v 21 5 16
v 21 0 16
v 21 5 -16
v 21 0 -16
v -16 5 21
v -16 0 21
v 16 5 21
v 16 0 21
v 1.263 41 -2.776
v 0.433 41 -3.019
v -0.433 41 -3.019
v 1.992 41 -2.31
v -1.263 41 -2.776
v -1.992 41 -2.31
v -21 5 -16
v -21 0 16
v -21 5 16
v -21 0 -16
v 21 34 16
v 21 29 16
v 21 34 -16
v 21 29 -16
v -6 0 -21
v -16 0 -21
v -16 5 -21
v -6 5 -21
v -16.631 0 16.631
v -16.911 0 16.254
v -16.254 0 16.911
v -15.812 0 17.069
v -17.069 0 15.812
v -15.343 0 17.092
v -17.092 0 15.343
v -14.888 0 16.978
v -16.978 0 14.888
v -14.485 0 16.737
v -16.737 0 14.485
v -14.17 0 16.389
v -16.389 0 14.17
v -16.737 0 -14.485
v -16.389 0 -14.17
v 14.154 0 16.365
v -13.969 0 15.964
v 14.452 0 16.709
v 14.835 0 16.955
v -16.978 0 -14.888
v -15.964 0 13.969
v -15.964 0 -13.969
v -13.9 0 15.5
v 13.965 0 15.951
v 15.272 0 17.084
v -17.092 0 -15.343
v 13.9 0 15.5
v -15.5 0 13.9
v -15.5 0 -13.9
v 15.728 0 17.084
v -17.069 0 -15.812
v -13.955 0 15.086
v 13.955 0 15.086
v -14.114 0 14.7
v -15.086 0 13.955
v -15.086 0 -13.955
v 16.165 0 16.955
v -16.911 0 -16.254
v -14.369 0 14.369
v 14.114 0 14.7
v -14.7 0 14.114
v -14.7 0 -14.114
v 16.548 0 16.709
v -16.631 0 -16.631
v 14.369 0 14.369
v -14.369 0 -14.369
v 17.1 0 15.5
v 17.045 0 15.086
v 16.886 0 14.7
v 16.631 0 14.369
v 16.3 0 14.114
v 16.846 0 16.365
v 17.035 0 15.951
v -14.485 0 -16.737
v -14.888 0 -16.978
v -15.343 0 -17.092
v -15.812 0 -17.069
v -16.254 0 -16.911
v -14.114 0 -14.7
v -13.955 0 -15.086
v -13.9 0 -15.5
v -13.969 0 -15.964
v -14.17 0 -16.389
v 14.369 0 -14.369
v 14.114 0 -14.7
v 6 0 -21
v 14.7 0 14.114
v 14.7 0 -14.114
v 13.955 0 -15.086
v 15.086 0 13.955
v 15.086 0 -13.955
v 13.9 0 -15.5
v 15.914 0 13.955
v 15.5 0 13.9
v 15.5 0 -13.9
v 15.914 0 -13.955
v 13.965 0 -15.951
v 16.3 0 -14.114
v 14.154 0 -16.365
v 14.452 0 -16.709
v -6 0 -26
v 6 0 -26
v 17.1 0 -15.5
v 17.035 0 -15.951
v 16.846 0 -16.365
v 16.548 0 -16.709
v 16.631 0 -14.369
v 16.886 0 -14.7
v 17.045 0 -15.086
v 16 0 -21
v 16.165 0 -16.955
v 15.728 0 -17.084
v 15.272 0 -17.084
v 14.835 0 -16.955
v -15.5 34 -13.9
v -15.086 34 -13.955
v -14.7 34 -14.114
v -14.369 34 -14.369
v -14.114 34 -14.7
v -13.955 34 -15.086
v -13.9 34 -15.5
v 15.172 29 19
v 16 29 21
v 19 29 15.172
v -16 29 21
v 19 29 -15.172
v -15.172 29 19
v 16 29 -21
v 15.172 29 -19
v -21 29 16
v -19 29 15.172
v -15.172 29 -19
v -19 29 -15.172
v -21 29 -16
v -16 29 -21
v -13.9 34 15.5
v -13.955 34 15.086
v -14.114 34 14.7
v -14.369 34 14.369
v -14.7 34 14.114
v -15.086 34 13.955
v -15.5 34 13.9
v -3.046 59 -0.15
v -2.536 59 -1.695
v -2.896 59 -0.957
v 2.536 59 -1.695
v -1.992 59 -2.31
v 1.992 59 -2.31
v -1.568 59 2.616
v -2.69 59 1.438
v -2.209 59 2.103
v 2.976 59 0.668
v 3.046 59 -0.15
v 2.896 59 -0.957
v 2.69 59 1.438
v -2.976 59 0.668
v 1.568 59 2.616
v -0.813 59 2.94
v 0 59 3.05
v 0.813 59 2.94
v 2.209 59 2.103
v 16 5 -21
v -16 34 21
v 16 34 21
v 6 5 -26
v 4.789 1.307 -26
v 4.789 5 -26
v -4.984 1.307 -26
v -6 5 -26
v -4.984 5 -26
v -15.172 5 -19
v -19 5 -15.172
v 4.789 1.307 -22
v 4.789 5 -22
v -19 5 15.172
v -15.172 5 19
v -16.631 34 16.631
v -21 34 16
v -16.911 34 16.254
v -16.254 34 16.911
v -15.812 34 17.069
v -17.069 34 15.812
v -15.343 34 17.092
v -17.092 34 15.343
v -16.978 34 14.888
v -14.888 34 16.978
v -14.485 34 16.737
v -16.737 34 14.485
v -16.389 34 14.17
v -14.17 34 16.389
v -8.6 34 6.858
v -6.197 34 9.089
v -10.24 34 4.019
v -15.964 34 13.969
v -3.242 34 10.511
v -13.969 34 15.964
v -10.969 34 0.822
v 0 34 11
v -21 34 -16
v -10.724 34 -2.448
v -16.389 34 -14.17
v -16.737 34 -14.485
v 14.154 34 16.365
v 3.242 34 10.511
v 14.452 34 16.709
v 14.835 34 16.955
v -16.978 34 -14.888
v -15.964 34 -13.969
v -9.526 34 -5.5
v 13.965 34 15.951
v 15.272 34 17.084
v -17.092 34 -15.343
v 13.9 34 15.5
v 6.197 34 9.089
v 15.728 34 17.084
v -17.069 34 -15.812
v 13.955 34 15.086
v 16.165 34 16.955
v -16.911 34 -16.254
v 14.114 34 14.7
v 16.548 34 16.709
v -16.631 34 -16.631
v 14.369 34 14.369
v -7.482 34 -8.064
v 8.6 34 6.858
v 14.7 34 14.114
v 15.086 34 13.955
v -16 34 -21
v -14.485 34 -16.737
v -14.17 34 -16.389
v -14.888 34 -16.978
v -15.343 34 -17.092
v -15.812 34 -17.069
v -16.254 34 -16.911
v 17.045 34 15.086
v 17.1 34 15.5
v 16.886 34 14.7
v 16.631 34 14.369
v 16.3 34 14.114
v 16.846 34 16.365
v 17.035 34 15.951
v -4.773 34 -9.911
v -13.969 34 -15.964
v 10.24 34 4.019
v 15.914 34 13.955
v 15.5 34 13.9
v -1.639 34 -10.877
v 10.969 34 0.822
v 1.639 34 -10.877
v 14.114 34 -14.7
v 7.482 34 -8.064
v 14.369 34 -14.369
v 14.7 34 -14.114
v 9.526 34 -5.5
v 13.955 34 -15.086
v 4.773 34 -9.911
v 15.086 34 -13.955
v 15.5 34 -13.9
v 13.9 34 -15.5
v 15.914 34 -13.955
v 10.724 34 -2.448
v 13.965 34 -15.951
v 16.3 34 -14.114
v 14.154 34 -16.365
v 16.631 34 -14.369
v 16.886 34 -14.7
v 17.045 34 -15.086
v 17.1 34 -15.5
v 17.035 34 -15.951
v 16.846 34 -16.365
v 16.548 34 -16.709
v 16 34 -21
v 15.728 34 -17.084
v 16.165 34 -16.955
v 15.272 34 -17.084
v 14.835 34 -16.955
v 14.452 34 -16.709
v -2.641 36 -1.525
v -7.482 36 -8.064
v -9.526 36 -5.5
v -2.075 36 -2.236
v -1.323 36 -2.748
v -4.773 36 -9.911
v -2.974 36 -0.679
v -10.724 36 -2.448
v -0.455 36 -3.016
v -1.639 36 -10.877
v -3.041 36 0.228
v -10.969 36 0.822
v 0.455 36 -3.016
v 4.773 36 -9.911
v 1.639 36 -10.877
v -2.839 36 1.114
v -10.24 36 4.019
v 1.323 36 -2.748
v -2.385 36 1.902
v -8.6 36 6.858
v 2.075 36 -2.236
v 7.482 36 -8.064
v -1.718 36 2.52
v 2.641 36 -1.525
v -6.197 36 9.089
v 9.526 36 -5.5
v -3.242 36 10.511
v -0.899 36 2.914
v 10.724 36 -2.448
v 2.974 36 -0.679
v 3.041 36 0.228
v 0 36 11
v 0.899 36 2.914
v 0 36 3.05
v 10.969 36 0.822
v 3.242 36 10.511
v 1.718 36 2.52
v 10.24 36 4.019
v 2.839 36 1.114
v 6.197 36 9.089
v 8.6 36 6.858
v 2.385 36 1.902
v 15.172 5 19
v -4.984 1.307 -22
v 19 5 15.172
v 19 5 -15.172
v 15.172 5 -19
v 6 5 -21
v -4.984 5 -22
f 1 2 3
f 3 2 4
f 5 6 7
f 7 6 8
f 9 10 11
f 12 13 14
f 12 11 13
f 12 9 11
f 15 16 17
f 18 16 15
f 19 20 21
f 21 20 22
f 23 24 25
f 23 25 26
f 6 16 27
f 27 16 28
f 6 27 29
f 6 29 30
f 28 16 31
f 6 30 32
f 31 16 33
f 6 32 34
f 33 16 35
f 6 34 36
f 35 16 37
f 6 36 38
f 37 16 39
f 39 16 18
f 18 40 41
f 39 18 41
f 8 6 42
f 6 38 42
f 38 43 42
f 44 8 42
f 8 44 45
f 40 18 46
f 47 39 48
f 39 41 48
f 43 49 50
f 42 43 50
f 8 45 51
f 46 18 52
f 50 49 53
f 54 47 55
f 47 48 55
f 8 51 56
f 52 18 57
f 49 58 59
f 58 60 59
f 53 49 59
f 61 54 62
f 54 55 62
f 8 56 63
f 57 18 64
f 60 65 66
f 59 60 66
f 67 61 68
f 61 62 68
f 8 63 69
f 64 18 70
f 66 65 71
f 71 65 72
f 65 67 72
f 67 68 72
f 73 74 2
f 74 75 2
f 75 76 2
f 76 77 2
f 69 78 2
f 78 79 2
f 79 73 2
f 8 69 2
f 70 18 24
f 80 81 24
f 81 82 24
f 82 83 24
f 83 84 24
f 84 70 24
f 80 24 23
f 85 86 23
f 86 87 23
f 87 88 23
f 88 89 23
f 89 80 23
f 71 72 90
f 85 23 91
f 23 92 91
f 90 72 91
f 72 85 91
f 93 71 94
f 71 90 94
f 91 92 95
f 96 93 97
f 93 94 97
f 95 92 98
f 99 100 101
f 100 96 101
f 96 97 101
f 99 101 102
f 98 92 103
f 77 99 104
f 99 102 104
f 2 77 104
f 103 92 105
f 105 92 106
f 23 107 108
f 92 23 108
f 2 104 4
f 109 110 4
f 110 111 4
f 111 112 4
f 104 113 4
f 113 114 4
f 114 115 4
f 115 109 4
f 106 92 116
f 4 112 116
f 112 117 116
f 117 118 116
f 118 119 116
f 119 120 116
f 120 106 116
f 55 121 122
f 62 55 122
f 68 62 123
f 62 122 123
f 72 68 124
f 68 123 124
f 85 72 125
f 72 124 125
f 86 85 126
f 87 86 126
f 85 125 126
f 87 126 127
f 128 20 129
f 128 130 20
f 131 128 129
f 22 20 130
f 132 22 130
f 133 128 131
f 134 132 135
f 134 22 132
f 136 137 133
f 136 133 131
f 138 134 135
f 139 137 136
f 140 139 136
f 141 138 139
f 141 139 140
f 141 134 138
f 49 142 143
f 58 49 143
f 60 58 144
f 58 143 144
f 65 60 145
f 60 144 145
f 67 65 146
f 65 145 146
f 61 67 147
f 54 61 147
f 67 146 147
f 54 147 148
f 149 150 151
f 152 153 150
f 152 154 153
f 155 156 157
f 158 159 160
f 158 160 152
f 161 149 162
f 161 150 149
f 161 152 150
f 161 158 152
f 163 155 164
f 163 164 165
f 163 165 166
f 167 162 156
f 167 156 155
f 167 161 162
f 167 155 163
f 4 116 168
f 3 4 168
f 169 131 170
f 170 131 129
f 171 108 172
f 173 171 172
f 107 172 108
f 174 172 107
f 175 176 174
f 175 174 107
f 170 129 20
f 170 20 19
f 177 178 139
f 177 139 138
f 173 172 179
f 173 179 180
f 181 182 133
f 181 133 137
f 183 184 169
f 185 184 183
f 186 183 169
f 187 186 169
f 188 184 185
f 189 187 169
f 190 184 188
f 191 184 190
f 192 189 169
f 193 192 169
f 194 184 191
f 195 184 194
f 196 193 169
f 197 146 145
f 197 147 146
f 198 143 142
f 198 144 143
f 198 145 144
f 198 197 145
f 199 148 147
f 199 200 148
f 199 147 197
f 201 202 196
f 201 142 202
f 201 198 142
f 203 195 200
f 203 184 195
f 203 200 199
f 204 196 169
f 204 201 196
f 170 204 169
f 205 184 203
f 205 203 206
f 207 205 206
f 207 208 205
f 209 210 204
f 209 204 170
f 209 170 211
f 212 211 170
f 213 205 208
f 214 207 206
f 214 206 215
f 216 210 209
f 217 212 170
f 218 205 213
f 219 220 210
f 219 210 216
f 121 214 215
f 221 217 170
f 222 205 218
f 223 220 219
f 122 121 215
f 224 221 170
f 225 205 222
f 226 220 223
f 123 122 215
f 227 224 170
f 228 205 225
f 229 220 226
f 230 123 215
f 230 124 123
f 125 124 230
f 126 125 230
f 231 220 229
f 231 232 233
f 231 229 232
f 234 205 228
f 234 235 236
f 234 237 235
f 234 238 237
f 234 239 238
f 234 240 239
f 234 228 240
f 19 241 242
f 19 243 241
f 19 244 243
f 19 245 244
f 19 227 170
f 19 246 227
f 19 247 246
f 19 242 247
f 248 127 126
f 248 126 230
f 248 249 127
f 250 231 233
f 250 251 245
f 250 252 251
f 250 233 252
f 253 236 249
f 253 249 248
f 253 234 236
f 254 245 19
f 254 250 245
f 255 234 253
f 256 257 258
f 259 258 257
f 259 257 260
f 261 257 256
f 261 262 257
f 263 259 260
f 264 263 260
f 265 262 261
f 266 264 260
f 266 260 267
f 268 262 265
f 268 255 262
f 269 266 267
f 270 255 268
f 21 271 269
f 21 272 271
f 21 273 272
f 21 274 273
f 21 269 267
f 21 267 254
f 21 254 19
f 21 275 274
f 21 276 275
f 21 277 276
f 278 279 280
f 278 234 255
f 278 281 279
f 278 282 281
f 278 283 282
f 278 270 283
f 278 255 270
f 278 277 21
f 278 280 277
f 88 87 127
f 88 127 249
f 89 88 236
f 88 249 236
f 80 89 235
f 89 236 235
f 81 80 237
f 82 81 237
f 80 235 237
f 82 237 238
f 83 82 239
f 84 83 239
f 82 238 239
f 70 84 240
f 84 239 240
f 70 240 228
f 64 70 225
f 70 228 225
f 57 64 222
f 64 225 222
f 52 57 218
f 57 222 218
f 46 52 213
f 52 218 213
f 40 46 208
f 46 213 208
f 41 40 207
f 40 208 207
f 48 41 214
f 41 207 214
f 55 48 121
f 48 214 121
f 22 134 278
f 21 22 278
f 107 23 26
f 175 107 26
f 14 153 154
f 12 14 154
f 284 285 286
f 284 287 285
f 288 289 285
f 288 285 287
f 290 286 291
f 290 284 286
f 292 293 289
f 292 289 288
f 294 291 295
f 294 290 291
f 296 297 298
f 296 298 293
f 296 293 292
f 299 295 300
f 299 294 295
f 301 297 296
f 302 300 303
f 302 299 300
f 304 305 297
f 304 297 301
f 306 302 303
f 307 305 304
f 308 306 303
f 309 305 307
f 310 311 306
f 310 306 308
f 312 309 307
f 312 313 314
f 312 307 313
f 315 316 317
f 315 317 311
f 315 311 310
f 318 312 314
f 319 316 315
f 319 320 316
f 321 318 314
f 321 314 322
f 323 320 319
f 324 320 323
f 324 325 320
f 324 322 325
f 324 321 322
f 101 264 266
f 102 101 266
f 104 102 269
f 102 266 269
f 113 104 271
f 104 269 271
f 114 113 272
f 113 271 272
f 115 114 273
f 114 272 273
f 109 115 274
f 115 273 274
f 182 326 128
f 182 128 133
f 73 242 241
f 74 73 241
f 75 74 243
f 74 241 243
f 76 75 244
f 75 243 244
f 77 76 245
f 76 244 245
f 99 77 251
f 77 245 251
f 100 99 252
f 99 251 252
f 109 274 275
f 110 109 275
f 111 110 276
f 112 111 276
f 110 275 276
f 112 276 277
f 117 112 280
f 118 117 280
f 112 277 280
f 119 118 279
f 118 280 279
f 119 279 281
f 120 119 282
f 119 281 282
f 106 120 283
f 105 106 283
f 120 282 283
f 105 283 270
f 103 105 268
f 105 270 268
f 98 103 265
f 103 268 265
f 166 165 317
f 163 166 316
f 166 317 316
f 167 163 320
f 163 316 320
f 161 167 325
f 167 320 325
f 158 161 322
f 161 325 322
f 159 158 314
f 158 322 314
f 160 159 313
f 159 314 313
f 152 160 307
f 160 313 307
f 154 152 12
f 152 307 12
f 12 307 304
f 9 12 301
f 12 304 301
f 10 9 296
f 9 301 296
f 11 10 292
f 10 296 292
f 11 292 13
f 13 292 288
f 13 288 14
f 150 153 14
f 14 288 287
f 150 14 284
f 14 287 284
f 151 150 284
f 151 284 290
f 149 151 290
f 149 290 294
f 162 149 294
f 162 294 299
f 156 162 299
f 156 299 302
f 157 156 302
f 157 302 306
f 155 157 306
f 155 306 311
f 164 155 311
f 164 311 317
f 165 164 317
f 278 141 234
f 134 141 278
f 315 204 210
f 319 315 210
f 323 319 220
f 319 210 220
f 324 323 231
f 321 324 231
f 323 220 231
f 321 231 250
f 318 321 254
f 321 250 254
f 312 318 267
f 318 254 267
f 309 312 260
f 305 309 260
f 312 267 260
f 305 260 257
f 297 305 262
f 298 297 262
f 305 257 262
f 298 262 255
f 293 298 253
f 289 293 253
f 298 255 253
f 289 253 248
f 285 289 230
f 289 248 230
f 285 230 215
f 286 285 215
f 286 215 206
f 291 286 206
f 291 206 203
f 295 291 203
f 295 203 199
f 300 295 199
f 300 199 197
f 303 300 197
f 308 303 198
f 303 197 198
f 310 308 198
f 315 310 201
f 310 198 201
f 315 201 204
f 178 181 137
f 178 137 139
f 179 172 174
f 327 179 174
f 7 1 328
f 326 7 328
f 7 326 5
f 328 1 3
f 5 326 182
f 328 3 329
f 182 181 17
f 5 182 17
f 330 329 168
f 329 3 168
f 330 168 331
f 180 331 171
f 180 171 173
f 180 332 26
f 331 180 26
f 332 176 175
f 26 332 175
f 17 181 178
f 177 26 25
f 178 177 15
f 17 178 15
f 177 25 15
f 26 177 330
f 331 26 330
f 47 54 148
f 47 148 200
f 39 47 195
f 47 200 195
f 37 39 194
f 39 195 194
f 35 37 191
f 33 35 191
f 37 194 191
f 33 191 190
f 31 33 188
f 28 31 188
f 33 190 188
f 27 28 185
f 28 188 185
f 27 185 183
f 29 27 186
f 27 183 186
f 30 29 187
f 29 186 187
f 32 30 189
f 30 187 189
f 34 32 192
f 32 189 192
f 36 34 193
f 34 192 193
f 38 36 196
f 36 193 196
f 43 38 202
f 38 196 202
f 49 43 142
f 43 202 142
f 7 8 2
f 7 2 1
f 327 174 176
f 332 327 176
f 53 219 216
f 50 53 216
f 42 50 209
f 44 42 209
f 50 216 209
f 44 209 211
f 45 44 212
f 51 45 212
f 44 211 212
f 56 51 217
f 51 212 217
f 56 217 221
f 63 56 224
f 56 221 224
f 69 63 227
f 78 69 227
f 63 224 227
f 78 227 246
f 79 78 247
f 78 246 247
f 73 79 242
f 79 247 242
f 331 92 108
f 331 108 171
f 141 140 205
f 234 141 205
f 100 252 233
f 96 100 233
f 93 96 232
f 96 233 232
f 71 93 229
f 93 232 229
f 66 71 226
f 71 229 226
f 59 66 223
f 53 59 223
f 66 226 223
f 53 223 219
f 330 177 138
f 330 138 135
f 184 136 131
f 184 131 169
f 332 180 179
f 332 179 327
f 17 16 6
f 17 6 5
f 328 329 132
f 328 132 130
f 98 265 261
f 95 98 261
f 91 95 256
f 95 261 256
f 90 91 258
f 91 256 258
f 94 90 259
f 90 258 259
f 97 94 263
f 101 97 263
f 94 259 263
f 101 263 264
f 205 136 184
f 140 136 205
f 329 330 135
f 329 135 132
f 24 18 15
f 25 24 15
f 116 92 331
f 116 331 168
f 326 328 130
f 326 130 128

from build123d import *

# Parameters (mm, degrees)
SKETCH_1_W          = 42
SKETCH_1_H          = 42
EXTRUDE_1_DEPTH     = 34
SKETCH_2_R          = 11
EXTRUDE_2_DEPTH     = 2
SKETCH_3_R          = 3.05
EXTRUDE_3_DEPTH     = 23
SKETCH_4_W          = 6.575865178
SKETCH_4_H          = 2.726578245
CUT_EXTRUDE_1_DEPTH = 18
CUT_EXTRUDE_2_DEPTH = 46.144213361
CHAMFER_1_SIZE      = 5
CUT_EXTRUDE_3_DEPTH = 24
SKETCH_7_W          = 12
SKETCH_7_H          = 5
EXTRUDE_4_DEPTH     = 5
SKETCH_8_W          = 9.77285119
SKETCH_8_H          = 3.692990437
CUT_EXTRUDE_4_DEPTH = 4


with BuildPart() as part:
    # 草图1 → 凸台-拉伸1 (new body)
    with BuildSketch(Plane(origin=(0, 0, 0), x_dir=(1, 0, 0), z_dir=(0, 1, 0))):
        Rectangle(SKETCH_1_W, SKETCH_1_H)
    extrude(amount=EXTRUDE_1_DEPTH)

    # 草图2 → 凸台-拉伸2 (add)
    with BuildSketch(Plane(origin=(0, 34, 0), x_dir=(1, 0, 0), z_dir=(0, 1, 0))):
        with Locations(Location((0, 0, 0), (0, 0, 270))):
            Circle(SKETCH_2_R)
    extrude(amount=EXTRUDE_2_DEPTH)

    # 草图3 → 凸台-拉伸3 (add)
    with BuildSketch(Plane(origin=(0, 36, 0), x_dir=(1, 0, 0), z_dir=(0, 1, 0))):
        with Locations(Location((0, 0, 0), (0, 0, 270))):
            Circle(SKETCH_3_R)
    extrude(amount=EXTRUDE_3_DEPTH)

    # 草图4 → 切除-拉伸1 (cut)
    with BuildSketch(Plane(origin=(0, 59, 0), x_dir=(1, 0, 0), z_dir=(0, 1, 0))):
        with Locations((-0.016038696, 3.672861282)):
            Rectangle(SKETCH_4_W, SKETCH_4_H)
    extrude(amount=-CUT_EXTRUDE_1_DEPTH, mode=Mode.SUBTRACT)

    # 草图5 → 切除-拉伸2 (cut, through all)
    with BuildSketch(Plane(origin=(0, 34, 0), x_dir=(1, 0, 0), z_dir=(0, 1, 0))):
        with BuildLine():
            ThreePointArc((17.1, -15.5), (16.63137085, -14.36862915), (15.5, -13.9))
            Line((15.5, -13.9), (15.5, -15.5))
            Line((15.5, -15.5), (13.9, -15.5))
            ThreePointArc((13.9, -15.5), (15.5, -17.1), (17.1, -15.5))
        make_face()
        with BuildLine():
            Line((15.5, -15.5), (15.5, -13.9))
            ThreePointArc((15.5, -13.9), (14.36862915, -14.36862915), (13.9, -15.5))
            Line((13.9, -15.5), (15.5, -15.5))
        make_face()
        with BuildLine():
            ThreePointArc((-13.9, -15.5), (-14.36862915, -14.36862915), (-15.5, -13.9))
            Line((-15.5, -13.9), (-15.5, -15.5))
            Line((-15.5, -15.5), (-13.9, -15.5))
        make_face()
        with BuildLine():
            Line((-15.5, -15.5), (-15.5, -13.9))
            ThreePointArc((-15.5, -13.9), (-16.63137085, -16.63137085), (-13.9, -15.5))
            Line((-13.9, -15.5), (-15.5, -15.5))
        make_face()
        with BuildLine():
            ThreePointArc((-15.5, 13.9), (-14.36862915, 14.36862915), (-13.9, 15.5))
            Line((-13.9, 15.5), (-15.5, 15.5))
            Line((-15.5, 15.5), (-15.5, 13.9))
        make_face()
        with BuildLine():
            Line((-15.5, 15.5), (-13.9, 15.5))
            ThreePointArc((-13.9, 15.5), (-16.63137085, 16.63137085), (-15.5, 13.9))
            Line((-15.5, 13.9), (-15.5, 15.5))
        make_face()
        with BuildLine():
            ThreePointArc((17.1, 15.5), (15.5, 17.1), (13.9, 15.5))
            Line((13.9, 15.5), (15.5, 15.5))
            Line((15.5, 15.5), (15.5, 13.9))
            ThreePointArc((15.5, 13.9), (16.63137085, 14.36862915), (17.1, 15.5))
        make_face()
        with BuildLine():
            Line((15.5, 15.5), (13.9, 15.5))
            ThreePointArc((13.9, 15.5), (14.36862915, 14.36862915), (15.5, 13.9))
            Line((15.5, 13.9), (15.5, 15.5))
        make_face()
    extrude(amount=-CUT_EXTRUDE_2_DEPTH, mode=Mode.SUBTRACT)

    # 倒角1
    chamfer_1_edges = [part.edges().sort_by_distance(p)[0] for p in [
        (-21, 17, -21),
        (21, 17, -21),
        (21, 17, 21),
        (-21, 17, 21),
    ]]
    chamfer(chamfer_1_edges, length=CHAMFER_1_SIZE)

    # 草图6 → 切除-拉伸3 (cut)
    with BuildSketch(Plane(origin=(0, 5, 0), x_dir=(-1, 0, 0), z_dir=(0, -1, 0))):
        Polygon((-21, 16), (-21, -16), (-16, -21), (16, -21), (21, -16), (21, 16), (16, 21), (-16, 21), align=None)
        Polygon((-19, 15.171572875), (-19, -15.171572875), (-15.171572875, -19), (15.171572875, -19), (19, -15.171572875), (19, 15.171572875), (15.171572875, 19), (-15.171572875, 19), align=None, mode=Mode.SUBTRACT)
    extrude(amount=-CUT_EXTRUDE_3_DEPTH, mode=Mode.SUBTRACT)

    # 草图7 → 凸台-拉伸4 (add)
    with BuildSketch(Plane(origin=(0, 0, -21), x_dir=(-1, 0, 0), z_dir=(0, 0, -1))):
        with Locations((0, 2.5)):
            Rectangle(SKETCH_7_W, SKETCH_7_H)
    extrude(amount=EXTRUDE_4_DEPTH)

    # 草图8 → 切除-拉伸4 (cut)
    with BuildSketch(Plane(origin=(0, 0, -26), x_dir=(-1, 0, 0), z_dir=(0, 0, -1))):
        with Locations((0.097667739, 3.153504782)):
            Rectangle(SKETCH_8_W, SKETCH_8_H)
    extrude(amount=-CUT_EXTRUDE_4_DEPTH, mode=Mode.SUBTRACT)


solid = part.part
